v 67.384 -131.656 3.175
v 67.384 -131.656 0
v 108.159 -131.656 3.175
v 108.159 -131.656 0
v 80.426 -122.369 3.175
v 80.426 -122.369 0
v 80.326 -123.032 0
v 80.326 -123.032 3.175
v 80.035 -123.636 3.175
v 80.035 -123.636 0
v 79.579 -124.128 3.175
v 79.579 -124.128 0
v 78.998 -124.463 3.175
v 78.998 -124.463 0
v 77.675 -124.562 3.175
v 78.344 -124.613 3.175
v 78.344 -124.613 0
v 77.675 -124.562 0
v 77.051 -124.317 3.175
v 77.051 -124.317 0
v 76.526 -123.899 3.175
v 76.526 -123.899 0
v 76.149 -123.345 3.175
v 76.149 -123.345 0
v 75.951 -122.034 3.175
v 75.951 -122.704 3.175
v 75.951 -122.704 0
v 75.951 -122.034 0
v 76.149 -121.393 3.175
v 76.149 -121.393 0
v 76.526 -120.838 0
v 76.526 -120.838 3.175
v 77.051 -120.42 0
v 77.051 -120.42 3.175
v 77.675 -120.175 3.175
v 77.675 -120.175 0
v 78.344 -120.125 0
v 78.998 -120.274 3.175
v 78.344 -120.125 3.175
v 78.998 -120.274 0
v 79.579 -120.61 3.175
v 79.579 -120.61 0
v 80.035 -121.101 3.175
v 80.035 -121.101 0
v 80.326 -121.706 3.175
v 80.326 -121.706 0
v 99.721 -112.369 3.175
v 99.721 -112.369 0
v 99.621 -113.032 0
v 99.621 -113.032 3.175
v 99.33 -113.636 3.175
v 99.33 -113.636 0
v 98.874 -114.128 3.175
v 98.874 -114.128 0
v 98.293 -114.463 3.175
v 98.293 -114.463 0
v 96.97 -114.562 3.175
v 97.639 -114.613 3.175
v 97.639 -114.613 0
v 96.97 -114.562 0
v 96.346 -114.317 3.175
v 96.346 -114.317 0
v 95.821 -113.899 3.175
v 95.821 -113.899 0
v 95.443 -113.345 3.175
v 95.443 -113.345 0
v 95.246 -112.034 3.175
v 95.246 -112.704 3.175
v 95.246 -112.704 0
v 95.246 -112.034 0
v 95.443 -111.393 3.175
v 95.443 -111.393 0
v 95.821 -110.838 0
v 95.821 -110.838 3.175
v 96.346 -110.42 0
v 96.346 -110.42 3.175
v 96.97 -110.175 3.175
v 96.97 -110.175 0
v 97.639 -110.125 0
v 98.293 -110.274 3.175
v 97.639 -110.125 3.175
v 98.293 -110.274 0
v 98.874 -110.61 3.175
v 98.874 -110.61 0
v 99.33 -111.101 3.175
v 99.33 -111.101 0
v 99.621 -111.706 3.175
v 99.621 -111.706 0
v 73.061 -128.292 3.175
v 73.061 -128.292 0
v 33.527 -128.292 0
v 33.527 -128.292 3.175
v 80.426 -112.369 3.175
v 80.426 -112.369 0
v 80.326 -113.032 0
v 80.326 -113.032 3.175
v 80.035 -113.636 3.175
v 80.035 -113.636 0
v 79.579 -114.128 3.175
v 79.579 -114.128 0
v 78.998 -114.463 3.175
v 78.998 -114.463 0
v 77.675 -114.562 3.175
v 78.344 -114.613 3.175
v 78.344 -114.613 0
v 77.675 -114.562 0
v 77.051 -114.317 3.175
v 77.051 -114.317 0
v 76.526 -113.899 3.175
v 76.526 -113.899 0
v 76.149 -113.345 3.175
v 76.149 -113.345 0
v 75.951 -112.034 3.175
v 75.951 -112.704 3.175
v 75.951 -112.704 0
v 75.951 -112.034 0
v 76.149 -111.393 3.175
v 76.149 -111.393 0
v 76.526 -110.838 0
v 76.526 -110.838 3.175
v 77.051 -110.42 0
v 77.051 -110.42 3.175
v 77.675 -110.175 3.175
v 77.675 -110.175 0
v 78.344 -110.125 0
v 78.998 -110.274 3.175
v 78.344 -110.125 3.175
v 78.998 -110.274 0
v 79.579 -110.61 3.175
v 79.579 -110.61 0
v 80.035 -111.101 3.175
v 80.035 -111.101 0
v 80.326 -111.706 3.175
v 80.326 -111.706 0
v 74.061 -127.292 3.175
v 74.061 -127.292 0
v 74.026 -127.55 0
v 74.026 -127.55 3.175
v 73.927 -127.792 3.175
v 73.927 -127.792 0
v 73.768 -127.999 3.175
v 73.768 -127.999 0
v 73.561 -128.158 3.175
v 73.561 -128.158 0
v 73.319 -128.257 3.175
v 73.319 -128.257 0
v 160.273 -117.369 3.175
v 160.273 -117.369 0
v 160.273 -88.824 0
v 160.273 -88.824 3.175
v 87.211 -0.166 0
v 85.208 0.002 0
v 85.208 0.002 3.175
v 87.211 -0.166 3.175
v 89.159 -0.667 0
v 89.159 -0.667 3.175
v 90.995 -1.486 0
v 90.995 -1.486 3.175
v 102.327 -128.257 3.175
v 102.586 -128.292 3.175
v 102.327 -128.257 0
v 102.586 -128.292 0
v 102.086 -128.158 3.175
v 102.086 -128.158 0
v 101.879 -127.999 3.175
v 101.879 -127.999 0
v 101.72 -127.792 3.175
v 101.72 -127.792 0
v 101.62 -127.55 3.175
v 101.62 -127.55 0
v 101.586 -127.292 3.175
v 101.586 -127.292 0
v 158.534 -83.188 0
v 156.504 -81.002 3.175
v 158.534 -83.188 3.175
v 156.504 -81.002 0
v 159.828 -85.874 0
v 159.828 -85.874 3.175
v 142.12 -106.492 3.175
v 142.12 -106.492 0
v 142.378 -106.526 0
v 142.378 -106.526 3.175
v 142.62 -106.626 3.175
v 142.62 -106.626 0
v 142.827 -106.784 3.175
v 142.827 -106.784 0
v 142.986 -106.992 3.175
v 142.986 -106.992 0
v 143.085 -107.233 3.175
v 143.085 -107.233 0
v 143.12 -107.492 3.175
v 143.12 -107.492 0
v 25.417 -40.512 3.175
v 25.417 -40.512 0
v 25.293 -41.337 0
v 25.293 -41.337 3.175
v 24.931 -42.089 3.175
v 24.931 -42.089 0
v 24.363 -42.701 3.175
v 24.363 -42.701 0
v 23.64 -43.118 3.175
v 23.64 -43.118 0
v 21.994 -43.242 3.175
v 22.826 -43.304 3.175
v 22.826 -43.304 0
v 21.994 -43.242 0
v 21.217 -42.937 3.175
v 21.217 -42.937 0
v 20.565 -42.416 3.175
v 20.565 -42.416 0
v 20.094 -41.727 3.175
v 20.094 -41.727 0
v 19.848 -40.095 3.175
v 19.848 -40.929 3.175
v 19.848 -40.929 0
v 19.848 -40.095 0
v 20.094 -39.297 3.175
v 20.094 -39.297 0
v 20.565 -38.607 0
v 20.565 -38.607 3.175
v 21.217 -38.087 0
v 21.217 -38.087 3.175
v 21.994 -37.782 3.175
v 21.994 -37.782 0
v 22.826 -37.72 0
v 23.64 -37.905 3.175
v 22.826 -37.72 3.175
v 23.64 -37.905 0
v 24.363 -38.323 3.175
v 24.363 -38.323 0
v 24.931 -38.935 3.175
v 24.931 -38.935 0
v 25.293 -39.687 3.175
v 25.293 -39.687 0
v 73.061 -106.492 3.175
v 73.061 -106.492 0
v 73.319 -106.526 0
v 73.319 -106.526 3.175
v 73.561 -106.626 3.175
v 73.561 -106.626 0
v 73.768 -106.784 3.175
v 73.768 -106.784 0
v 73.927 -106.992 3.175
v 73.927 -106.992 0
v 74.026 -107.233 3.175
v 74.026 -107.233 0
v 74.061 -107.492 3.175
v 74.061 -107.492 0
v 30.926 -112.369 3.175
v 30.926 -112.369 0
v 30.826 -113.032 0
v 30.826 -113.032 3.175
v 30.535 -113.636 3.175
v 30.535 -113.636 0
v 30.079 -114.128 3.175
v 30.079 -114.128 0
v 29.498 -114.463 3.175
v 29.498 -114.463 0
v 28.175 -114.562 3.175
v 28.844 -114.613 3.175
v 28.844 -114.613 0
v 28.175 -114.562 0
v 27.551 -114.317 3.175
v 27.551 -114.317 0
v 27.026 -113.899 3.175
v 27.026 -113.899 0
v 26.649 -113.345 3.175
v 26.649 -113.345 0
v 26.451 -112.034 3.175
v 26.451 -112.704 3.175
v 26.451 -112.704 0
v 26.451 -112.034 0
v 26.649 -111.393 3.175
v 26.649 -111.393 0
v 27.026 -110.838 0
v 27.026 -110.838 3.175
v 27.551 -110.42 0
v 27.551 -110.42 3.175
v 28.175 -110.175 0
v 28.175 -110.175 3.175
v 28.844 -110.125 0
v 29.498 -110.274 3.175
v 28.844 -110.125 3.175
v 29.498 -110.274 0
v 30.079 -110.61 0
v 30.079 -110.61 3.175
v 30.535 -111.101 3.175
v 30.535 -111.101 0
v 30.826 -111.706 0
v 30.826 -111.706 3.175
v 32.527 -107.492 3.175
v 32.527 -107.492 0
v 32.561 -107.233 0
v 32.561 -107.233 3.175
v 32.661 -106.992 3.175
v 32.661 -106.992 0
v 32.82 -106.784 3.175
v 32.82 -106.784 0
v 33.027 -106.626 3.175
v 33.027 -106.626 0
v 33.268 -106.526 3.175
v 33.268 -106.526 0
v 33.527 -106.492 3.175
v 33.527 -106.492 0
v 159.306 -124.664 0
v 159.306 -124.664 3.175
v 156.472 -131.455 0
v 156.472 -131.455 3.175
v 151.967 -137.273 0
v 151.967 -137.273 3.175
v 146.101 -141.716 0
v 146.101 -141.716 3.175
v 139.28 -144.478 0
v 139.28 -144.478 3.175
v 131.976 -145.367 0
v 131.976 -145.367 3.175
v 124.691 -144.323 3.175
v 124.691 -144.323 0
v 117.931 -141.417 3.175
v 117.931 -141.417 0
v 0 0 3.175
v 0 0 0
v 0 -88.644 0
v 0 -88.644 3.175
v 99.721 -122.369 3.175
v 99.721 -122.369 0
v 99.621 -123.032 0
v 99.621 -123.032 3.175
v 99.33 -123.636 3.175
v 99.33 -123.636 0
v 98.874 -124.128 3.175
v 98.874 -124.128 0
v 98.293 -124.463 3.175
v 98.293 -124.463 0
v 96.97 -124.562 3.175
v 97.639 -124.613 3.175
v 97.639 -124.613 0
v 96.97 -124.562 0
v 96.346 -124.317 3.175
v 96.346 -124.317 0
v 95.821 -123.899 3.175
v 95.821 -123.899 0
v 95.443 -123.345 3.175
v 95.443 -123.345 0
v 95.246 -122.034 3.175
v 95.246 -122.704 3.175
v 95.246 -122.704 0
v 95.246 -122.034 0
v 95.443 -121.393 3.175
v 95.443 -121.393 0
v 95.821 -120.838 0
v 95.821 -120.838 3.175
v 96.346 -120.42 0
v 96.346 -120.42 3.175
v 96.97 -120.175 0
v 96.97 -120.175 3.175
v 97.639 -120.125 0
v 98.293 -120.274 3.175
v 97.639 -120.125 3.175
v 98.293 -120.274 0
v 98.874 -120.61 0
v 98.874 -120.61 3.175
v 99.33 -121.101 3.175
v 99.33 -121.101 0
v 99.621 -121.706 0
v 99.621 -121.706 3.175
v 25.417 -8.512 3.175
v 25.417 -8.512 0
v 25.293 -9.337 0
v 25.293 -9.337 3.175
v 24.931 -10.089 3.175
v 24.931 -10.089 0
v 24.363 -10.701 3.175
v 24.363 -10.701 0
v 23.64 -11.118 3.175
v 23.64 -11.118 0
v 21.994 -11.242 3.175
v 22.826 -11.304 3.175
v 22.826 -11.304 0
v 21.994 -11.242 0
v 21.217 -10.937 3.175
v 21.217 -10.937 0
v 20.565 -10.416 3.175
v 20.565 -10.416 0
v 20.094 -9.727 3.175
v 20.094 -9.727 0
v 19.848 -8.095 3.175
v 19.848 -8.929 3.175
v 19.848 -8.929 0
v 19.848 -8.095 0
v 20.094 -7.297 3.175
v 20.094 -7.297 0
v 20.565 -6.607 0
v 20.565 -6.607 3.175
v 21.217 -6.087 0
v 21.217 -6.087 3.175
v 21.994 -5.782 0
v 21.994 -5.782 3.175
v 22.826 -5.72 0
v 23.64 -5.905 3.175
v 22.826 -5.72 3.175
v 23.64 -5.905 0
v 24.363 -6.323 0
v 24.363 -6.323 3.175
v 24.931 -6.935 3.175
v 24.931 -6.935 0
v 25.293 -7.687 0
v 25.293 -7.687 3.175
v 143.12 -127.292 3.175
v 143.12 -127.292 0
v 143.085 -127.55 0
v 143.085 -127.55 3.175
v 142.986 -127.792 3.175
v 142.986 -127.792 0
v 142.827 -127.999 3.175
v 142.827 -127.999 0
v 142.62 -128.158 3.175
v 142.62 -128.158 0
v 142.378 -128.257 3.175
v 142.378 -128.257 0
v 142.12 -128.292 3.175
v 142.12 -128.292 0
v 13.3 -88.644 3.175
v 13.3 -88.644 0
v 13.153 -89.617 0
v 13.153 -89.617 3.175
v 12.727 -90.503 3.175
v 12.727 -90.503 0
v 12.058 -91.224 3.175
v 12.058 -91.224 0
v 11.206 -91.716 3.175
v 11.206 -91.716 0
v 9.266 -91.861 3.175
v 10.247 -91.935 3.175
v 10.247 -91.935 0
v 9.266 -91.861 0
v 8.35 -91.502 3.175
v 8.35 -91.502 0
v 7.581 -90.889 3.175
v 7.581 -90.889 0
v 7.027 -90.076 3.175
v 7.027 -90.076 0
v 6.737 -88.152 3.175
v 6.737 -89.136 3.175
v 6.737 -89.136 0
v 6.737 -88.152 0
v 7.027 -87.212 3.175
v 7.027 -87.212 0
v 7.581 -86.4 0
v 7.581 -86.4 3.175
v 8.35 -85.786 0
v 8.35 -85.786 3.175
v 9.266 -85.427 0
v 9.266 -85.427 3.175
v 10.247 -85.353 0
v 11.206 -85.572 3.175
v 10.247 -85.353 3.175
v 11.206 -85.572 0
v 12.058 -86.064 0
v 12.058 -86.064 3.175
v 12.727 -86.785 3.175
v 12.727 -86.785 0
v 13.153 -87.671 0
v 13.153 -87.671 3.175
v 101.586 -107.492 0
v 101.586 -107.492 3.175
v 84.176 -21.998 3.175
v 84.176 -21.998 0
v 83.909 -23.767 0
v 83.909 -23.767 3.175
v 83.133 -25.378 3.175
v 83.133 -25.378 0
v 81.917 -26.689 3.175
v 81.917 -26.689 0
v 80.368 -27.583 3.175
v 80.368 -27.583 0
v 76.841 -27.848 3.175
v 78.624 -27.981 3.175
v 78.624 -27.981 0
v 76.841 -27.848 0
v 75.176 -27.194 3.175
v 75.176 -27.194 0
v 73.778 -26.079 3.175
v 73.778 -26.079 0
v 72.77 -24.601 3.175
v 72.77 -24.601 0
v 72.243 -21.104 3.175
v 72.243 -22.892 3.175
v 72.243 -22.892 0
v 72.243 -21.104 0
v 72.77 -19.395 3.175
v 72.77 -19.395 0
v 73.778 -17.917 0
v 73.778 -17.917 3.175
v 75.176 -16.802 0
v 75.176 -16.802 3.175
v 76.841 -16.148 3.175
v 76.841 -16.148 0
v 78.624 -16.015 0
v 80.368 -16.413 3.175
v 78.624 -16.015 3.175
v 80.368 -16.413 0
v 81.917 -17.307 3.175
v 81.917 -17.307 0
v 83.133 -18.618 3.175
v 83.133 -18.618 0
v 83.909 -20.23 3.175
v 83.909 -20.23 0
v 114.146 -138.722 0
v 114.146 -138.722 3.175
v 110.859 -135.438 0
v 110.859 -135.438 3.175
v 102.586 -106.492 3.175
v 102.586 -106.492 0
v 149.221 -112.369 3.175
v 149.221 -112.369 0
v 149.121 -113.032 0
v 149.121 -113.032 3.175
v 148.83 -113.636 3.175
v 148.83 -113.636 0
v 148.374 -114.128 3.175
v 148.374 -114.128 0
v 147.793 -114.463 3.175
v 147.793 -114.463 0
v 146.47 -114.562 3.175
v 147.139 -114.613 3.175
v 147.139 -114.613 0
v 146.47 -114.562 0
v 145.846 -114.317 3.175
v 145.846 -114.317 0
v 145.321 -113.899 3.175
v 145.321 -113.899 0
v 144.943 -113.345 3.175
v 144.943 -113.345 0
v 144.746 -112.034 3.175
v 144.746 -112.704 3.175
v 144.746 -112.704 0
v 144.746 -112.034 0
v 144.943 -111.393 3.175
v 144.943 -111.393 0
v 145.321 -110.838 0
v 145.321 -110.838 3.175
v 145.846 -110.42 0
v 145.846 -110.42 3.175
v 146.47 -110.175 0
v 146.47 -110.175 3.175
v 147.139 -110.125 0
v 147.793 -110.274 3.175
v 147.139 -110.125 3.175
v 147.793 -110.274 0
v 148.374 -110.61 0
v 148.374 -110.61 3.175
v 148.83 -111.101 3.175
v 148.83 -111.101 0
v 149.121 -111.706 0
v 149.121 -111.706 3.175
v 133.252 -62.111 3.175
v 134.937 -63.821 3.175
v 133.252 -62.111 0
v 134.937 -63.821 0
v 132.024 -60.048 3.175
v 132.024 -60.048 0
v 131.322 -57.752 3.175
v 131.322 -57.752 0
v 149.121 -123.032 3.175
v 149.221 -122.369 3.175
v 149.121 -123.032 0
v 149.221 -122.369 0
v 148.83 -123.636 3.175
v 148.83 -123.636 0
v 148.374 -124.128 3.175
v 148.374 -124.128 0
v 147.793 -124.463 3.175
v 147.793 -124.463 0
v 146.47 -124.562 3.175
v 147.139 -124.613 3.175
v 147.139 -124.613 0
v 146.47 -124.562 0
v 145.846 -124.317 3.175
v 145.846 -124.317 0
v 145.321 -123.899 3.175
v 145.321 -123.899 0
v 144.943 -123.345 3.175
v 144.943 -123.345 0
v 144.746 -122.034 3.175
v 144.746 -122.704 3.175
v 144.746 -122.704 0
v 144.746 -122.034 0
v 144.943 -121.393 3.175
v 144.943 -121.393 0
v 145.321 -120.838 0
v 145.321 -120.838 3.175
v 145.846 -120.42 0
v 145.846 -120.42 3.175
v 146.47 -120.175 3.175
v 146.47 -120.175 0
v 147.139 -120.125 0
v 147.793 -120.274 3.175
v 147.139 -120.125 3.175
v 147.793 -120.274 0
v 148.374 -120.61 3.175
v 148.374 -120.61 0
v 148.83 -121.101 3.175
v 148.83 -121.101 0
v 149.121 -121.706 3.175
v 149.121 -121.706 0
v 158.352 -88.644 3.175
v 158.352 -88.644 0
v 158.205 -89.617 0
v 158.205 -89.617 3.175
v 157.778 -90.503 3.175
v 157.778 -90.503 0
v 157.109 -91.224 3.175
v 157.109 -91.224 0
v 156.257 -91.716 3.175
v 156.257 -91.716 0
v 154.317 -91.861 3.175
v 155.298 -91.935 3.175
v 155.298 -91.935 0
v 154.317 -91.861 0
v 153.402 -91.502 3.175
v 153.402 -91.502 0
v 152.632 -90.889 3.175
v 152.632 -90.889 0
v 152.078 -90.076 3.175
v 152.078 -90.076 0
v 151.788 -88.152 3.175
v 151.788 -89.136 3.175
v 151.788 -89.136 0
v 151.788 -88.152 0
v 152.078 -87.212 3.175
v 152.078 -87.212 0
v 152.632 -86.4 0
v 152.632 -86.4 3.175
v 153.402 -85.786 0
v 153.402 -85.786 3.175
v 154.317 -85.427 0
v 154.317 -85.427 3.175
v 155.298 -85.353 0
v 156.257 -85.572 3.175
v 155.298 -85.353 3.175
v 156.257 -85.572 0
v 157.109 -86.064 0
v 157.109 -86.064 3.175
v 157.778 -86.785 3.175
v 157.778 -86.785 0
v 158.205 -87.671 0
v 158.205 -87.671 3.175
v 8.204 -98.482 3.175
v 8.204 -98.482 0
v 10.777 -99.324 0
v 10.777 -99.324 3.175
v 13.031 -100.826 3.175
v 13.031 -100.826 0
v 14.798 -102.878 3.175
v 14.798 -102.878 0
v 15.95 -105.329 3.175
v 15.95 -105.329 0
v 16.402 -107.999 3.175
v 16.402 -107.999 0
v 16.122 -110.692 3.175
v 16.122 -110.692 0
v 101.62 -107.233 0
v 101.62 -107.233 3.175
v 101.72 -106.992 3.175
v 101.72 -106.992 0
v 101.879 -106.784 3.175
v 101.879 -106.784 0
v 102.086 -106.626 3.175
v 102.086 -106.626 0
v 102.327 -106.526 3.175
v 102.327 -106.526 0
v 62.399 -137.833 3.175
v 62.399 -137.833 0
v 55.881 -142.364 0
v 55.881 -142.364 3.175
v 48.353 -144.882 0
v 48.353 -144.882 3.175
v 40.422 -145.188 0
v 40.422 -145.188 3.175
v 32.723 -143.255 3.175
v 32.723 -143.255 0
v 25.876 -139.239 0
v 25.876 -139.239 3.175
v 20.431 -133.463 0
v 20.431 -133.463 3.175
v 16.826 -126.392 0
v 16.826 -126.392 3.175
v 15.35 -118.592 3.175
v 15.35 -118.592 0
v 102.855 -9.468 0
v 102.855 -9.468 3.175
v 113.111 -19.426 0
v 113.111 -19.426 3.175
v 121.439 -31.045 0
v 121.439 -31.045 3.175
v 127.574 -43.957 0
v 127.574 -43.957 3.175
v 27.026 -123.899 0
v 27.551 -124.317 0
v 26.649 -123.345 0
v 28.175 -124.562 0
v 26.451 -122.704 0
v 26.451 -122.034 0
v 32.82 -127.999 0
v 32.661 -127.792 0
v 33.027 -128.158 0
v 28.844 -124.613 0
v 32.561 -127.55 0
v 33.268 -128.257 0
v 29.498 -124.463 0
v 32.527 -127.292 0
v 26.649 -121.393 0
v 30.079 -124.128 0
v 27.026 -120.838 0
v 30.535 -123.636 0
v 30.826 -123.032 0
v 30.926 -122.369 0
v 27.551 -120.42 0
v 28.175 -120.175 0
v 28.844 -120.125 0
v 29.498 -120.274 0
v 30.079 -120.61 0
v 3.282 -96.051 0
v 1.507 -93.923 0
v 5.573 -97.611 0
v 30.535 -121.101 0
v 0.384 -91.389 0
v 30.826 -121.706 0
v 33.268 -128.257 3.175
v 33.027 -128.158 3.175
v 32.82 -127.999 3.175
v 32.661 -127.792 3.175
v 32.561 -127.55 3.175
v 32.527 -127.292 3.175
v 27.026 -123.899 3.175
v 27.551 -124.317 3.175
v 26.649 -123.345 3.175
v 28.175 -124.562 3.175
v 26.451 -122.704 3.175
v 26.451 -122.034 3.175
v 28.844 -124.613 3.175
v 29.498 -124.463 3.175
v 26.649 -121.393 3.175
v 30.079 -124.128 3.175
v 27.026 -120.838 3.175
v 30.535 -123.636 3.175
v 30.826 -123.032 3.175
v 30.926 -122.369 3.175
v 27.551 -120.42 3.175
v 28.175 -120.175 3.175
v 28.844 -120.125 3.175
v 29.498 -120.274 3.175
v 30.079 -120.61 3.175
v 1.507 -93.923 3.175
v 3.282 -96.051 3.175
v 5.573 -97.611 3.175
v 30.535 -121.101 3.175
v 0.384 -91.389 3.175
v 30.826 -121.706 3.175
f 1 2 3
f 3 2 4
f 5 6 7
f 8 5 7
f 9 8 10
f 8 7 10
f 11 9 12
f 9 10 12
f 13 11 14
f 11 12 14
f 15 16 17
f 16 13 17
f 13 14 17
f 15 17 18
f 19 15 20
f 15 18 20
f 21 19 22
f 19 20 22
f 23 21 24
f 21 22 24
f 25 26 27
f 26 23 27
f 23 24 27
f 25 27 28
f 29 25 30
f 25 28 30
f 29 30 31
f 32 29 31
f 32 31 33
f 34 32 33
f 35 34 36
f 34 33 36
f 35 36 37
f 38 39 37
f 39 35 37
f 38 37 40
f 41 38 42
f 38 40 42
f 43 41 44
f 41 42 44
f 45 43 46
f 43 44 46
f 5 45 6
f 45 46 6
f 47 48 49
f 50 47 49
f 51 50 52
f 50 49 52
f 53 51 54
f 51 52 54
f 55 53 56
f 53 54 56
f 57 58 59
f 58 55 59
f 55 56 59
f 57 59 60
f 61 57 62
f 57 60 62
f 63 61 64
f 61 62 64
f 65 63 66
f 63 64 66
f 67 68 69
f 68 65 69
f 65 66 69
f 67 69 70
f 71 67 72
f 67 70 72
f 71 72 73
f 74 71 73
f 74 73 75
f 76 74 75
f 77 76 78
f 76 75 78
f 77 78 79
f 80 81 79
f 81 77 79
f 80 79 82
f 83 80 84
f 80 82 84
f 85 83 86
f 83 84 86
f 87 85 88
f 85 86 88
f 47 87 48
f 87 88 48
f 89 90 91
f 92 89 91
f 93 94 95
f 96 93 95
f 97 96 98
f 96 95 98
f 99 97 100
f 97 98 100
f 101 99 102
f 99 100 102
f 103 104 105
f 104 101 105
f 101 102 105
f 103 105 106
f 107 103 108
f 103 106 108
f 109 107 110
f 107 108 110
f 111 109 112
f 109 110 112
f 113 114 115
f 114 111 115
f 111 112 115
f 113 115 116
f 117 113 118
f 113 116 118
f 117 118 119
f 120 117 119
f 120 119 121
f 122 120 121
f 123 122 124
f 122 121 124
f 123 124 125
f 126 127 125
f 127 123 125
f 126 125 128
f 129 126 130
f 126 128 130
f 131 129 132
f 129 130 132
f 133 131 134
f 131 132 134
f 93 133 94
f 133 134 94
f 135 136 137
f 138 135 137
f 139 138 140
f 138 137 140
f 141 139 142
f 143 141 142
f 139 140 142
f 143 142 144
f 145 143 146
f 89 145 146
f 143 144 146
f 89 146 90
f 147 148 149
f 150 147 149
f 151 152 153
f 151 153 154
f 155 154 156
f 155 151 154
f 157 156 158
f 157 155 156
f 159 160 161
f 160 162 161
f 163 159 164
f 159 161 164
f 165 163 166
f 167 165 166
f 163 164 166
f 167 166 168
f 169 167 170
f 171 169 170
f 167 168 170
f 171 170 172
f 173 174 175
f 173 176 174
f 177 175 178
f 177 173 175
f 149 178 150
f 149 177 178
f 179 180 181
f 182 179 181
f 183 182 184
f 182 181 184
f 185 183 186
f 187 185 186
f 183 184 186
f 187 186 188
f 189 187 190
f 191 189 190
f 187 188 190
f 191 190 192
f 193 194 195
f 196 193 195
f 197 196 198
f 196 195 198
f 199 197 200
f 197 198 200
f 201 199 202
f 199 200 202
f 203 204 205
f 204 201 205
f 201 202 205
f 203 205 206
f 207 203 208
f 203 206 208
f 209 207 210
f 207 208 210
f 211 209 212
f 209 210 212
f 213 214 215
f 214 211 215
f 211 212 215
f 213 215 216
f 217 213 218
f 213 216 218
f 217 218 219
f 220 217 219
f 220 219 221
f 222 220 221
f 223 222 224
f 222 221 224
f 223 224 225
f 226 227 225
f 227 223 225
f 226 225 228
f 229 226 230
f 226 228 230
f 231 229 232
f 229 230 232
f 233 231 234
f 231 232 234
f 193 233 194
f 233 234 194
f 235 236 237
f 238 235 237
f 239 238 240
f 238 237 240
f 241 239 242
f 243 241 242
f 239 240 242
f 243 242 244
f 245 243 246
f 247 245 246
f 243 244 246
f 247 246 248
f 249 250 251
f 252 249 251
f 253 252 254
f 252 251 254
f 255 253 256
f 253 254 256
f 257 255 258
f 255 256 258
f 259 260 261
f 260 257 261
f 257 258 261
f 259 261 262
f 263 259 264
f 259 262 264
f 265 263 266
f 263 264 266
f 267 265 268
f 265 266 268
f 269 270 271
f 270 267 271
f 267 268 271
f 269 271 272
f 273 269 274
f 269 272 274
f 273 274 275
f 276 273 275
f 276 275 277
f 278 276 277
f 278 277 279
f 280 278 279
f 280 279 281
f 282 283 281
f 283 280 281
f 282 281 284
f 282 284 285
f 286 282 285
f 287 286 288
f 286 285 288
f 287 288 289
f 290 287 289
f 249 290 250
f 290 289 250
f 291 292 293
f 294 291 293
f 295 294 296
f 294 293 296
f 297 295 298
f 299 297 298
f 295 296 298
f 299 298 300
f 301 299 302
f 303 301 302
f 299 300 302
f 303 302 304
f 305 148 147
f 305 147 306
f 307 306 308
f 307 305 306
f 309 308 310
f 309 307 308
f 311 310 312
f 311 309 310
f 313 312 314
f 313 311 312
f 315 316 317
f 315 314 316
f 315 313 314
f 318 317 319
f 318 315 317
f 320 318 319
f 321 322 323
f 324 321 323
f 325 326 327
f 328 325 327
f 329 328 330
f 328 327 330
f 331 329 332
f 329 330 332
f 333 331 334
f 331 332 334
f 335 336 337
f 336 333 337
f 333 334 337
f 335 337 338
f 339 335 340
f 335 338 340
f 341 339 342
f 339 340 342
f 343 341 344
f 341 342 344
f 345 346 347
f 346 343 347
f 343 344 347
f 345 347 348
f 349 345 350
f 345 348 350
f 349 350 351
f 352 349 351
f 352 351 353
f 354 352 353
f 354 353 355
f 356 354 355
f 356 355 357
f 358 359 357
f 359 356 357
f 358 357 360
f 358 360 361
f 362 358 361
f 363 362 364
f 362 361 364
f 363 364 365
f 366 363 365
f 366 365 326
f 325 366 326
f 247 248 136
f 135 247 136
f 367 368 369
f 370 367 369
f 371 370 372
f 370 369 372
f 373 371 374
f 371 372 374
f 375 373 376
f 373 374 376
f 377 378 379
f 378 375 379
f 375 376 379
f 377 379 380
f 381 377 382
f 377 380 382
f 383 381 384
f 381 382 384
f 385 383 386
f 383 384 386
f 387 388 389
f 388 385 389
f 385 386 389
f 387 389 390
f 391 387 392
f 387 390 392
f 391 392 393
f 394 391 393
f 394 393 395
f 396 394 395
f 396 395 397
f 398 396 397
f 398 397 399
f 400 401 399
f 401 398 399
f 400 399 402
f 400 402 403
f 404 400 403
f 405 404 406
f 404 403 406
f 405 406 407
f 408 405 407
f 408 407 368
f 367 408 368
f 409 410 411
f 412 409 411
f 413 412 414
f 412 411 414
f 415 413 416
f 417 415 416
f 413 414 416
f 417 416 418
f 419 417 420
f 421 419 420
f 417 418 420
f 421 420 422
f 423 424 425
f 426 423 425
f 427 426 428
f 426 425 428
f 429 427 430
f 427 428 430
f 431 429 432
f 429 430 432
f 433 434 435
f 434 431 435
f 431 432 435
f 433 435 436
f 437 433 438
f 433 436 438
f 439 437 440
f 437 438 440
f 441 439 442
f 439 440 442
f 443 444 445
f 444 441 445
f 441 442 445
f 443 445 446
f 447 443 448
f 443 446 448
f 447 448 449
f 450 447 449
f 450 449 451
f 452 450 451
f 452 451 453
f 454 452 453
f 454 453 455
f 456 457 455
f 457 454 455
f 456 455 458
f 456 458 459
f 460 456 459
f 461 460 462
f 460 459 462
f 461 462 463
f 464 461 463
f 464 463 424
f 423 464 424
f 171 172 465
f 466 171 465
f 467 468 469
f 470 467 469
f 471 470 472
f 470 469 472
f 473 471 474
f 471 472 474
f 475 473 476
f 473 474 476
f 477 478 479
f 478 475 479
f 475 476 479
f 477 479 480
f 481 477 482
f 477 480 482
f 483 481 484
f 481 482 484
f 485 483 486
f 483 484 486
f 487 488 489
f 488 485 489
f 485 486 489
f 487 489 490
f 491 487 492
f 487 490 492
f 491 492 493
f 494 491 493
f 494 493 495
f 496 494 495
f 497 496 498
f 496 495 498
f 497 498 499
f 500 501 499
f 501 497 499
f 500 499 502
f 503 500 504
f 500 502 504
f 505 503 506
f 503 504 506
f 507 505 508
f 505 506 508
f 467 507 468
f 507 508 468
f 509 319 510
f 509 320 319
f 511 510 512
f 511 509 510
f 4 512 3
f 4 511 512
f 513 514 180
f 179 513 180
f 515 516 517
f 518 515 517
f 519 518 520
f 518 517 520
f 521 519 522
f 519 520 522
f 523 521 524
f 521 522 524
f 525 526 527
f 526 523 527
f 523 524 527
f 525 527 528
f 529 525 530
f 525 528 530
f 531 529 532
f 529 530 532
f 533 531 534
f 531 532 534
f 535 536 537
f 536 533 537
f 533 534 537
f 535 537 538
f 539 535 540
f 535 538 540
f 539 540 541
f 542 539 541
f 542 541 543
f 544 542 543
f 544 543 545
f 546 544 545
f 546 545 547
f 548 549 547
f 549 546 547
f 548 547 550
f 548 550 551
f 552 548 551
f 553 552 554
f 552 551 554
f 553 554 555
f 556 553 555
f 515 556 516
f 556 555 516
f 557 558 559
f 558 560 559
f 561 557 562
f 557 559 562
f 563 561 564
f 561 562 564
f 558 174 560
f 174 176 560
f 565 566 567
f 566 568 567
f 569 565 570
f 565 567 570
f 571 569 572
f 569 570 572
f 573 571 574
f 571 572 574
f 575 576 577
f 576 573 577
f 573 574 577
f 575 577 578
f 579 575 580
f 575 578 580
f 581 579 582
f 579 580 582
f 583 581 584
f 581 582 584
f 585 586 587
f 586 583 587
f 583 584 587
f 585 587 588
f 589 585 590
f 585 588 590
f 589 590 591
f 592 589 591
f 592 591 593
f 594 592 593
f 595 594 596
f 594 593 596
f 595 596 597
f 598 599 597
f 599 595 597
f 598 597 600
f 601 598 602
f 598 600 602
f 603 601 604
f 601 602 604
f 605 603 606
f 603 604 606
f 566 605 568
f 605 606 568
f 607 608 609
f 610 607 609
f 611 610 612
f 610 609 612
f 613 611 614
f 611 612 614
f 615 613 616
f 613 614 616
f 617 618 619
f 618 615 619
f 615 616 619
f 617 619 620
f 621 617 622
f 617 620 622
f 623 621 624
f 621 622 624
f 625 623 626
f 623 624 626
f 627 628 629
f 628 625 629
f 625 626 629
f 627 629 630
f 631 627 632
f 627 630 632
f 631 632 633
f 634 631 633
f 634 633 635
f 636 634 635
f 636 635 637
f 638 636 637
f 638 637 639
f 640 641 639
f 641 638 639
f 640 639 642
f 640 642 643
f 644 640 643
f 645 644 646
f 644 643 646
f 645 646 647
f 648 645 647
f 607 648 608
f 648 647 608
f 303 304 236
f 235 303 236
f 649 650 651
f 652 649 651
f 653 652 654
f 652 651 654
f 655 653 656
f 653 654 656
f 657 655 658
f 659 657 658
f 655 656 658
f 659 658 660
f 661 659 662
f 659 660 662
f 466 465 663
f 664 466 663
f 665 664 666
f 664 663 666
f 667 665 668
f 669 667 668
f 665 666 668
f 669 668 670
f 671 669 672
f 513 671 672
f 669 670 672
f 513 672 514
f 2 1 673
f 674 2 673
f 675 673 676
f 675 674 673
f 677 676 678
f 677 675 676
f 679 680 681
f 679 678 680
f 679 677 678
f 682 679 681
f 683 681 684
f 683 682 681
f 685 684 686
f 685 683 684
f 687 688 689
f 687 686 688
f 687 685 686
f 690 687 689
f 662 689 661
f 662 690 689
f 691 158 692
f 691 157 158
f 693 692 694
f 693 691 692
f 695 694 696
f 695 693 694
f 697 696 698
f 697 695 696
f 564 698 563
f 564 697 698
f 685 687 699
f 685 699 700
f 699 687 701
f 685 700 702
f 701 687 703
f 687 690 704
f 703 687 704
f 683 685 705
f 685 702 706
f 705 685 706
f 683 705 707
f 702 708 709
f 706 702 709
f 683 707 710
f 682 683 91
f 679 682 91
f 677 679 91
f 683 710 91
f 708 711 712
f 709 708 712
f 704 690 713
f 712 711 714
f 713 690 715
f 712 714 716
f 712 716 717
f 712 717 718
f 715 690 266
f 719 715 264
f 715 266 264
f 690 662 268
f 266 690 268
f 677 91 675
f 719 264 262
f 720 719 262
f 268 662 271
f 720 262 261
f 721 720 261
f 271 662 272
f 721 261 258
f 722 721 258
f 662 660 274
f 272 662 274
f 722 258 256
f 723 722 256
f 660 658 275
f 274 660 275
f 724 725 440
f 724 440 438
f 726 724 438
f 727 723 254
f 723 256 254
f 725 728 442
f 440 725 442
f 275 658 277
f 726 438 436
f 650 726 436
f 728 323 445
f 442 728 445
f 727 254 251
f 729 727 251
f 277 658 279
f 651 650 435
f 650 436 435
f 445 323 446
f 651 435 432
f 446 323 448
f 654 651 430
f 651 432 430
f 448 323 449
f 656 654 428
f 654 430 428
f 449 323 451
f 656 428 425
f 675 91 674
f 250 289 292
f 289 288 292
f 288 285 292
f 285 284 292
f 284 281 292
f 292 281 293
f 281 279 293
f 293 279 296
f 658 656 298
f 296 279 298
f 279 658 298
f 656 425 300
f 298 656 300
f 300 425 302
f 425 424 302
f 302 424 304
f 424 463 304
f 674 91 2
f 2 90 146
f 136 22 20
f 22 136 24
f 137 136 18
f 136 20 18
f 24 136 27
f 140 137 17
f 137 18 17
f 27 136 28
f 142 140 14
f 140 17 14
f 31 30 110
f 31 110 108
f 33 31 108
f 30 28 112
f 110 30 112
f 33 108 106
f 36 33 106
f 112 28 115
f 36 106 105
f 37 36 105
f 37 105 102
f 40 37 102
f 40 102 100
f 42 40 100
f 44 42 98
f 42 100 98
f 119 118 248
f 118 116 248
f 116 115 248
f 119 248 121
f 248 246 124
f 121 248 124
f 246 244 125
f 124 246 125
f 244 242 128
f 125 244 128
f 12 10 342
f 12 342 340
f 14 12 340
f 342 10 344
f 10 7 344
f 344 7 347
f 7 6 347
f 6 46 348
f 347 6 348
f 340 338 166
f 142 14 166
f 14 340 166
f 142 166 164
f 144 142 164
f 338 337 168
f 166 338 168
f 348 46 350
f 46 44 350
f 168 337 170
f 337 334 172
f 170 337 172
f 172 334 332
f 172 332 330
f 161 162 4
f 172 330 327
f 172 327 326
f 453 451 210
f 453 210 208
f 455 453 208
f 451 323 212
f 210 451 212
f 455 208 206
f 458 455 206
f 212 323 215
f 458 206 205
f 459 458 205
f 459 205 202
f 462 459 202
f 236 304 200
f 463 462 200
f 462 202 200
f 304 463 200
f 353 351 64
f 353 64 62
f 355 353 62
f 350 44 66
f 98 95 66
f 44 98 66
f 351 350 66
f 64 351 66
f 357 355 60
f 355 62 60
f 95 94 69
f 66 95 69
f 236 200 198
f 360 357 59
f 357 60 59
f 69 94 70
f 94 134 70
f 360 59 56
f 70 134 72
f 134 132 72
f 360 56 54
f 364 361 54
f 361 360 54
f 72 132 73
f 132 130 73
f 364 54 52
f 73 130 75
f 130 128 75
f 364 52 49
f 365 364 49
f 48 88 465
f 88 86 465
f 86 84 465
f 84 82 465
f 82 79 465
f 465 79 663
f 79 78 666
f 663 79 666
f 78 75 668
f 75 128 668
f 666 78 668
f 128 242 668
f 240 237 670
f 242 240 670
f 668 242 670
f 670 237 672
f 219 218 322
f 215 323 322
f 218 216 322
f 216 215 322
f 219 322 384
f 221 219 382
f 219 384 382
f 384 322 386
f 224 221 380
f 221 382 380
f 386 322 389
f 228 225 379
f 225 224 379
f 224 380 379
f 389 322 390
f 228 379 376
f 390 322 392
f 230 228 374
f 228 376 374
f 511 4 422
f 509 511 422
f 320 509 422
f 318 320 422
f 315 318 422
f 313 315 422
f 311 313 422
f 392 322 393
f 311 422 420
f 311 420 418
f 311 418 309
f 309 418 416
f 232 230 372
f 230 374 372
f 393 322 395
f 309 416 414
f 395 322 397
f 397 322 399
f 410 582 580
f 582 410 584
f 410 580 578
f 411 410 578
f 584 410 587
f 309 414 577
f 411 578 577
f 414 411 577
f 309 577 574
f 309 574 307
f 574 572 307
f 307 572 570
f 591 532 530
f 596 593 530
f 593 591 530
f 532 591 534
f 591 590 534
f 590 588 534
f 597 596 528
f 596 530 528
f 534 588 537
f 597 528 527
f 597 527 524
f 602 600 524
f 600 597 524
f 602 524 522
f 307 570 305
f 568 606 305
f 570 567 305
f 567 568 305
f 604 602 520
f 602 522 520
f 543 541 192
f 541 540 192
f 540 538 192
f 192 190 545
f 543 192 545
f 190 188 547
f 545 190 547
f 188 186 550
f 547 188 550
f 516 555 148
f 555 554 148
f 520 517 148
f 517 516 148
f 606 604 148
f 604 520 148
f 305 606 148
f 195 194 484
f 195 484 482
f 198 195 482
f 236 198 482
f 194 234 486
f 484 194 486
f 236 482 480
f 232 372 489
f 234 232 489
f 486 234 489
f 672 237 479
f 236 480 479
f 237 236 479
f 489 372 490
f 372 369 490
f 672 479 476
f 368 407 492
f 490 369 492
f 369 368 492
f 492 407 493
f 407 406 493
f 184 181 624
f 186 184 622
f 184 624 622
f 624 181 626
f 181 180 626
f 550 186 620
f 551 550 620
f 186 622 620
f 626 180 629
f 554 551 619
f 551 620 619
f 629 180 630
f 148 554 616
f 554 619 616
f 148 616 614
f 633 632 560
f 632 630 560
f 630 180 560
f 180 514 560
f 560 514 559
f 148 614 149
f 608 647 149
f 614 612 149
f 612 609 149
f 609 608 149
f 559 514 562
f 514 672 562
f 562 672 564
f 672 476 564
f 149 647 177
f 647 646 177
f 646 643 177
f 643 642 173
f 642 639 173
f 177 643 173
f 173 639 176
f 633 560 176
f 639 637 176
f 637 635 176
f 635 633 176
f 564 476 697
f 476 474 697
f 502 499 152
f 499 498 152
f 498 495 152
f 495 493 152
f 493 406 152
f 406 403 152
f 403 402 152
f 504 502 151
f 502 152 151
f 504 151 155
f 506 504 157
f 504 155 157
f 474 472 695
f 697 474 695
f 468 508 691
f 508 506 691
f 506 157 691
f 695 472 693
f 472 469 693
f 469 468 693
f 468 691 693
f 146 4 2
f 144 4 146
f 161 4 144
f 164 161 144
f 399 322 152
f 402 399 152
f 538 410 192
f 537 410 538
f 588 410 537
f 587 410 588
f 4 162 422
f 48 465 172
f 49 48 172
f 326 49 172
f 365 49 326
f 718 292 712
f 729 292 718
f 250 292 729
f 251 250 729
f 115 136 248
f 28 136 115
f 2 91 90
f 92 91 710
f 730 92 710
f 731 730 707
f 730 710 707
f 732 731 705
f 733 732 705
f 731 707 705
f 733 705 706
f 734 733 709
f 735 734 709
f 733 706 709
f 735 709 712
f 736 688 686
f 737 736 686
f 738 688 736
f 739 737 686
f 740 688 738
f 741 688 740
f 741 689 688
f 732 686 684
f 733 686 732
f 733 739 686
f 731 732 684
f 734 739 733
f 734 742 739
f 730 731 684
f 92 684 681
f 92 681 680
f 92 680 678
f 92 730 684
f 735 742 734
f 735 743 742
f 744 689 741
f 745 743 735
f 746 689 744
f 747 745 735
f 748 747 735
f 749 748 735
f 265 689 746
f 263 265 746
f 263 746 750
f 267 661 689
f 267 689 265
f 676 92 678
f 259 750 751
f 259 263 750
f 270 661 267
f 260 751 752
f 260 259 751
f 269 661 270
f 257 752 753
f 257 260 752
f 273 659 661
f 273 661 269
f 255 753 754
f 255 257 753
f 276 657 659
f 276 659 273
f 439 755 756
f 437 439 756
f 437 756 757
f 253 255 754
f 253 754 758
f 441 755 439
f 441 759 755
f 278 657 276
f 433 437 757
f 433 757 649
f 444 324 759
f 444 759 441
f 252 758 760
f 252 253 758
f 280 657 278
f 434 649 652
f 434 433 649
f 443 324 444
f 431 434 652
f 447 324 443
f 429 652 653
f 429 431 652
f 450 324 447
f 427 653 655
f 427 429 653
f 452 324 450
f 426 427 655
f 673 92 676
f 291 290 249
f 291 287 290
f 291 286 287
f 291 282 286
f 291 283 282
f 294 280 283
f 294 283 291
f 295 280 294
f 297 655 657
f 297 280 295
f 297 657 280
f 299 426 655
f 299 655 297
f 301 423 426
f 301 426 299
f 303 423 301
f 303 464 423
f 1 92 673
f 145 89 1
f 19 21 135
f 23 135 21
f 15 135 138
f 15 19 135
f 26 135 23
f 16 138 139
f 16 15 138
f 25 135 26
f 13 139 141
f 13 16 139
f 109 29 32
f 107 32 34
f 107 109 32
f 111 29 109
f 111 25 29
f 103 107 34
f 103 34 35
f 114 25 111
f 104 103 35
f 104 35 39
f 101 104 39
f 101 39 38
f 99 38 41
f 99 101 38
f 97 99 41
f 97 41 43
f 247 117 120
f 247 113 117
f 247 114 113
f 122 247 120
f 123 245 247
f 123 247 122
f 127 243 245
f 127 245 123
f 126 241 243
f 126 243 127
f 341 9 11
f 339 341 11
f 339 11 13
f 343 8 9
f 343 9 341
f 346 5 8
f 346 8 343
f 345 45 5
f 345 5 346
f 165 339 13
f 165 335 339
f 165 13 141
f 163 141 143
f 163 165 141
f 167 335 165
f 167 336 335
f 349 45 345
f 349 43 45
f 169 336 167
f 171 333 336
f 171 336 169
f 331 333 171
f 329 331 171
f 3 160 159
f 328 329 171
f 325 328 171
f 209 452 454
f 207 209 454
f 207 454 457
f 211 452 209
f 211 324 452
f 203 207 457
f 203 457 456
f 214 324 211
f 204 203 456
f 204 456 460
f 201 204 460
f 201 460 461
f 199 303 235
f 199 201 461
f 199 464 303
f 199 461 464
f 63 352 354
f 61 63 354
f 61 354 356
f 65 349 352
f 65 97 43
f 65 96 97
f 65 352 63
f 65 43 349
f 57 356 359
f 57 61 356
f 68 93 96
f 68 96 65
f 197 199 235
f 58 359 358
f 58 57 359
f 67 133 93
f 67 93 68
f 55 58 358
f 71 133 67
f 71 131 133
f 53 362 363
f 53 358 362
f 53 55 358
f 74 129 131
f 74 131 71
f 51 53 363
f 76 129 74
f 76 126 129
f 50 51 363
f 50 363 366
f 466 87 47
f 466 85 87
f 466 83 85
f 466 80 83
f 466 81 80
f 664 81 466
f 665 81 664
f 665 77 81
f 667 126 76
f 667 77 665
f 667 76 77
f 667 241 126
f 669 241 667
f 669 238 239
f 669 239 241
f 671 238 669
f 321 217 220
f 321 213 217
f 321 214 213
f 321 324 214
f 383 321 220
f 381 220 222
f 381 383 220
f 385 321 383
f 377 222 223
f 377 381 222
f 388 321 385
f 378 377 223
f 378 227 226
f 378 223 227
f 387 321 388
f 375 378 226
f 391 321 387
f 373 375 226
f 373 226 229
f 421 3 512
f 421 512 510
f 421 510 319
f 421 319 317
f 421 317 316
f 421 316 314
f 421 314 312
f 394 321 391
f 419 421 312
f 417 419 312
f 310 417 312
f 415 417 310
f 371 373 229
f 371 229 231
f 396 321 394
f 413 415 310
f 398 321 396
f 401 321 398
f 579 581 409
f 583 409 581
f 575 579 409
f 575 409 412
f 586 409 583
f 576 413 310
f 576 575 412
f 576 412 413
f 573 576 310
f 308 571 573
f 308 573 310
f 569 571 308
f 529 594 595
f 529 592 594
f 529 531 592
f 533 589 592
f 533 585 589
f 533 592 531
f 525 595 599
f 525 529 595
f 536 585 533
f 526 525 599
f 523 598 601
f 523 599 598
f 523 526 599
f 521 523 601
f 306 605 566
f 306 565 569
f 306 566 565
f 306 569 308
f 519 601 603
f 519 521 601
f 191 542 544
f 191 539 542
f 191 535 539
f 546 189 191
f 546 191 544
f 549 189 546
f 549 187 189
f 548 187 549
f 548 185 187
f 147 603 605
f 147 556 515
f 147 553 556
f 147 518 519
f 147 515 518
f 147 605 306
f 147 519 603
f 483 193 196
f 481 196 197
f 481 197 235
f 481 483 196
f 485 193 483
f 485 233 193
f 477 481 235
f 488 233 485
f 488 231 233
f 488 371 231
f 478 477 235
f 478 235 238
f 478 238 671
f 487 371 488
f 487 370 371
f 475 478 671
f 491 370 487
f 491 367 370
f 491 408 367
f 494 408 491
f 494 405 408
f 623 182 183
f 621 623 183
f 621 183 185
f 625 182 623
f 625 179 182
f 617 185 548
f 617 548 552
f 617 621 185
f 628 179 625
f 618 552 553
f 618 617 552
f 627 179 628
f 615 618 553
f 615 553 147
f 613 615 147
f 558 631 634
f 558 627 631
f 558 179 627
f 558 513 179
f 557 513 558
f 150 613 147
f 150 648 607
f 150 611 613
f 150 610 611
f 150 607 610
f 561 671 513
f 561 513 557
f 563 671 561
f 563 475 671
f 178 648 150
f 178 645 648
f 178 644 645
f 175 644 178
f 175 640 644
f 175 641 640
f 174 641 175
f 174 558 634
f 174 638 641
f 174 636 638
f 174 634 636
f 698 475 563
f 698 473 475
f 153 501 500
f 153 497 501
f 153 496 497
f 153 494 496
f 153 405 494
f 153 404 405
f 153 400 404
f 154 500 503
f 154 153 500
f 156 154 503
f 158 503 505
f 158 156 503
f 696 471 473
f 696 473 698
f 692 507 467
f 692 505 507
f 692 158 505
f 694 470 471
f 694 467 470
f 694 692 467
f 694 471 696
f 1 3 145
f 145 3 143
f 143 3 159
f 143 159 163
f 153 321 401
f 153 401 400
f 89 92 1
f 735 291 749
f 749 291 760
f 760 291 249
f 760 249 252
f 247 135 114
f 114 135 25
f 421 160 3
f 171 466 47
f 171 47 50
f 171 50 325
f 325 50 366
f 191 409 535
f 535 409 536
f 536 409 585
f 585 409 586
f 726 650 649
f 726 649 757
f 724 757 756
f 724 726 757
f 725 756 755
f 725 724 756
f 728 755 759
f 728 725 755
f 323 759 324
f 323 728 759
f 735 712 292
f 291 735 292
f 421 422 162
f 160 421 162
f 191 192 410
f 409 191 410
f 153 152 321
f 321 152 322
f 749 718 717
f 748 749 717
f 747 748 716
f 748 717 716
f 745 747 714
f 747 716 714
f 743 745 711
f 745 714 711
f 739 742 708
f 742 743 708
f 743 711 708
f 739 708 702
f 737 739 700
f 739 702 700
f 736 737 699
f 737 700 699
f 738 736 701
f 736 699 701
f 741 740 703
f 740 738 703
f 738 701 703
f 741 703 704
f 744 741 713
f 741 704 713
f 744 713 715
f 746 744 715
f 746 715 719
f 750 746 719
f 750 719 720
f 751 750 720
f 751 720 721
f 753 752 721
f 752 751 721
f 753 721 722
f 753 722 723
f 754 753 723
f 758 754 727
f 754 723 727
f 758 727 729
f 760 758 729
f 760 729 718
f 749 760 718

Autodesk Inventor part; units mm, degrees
ref_plane "YZ Plane" through (0, 0, 0) normal (1, 0, 0) x (0, 1, 0)
ref_plane "XZ Plane" through (0, 0, 0) normal (0, 1, 0) x (-1, 0, 0)
ref_plane "XY Plane" through (0, 0, 0) normal (0, 0, 1) x (1, 0, 0)
sketch "Sketch1" plane through (0, 0, 0) normal (0, 0, 1) x (1, 0, 0)
  arc A0 (16.121808, -110.692366) -> (67.383886, -131.656361) centre (43.321682, -117.338179) ccw
  line L0 (67.383886, -131.656361) -> (108.159478, -131.656361)
  arc A1 (108.159478, -131.656361) -> (139.594615, -90.326332) centre (132.221682, -117.338179) ccw
  arc A2 (132.227805, -80.679244) -> (139.594615, -90.326332) centre (142.227805, -80.679244) ccw
  line L1 (132.227805, -80.679244) -> (132.227805, -71.827)
  arc A3 (132.227805, -71.827) -> (90.658044, -1.487819) centre (51.933317, -71.827) ccw
  arc A4 (90.658044, -1.487819) -> (84.870639, 0) centre (84.870639, -12) ccw
  line L2 (84.870639, 0) -> (0, 0)
  line L3 (0, 0) -> (0, -88.644145)
  arc A5 (0, -88.644145) -> (8.203784, -98.481503) centre (10, -88.644145) ccw
  arc A6 (16.121808, -110.692366) -> (8.203784, -98.481503) centre (6.407567, -108.318861) ccw
  circle A7 centre (121.188208, -82.443861) radius 3.3
  arc A8 (145.794404, -114.286904) -> (148.095336, -110.420107) centre (146.970651, -112.368846) ccw
  circle A9 centre (97.470651, -122.368861) radius 2.25
  circle A10 centre (97.470651, -112.368852) radius 2.25
  circle A11 centre (78.175839, -122.368861) radius 2.25
  arc A12 (145.794404, -124.286918) -> (148.095336, -120.420122) centre (146.970651, -122.368861) ccw
  circle A13 centre (22.617078, -8.511936) radius 2.8
  circle A14 centre (22.617078, -40.511936) radius 2.8
  circle A15 centre (28.675839, -122.368861) radius 2.25
  circle A16 centre (28.675837, -112.368861) radius 2.25
  circle A17 centre (78.175837, -112.368855) radius 2.25
  circle A18 centre (10, -88.644145) radius 3.3
  line L4 (73.060526, -128.291526) -> (33.526976, -128.291526)
  arc A19 (32.526976, -127.291526) -> (33.526976, -128.291526) centre (33.526976, -127.291526) ccw
  line L5 (32.526976, -127.291526) -> (32.526973, -107.491526)
  arc A20 (33.526973, -106.491526) -> (32.526973, -107.491526) centre (33.526973, -107.491526) ccw
  line L6 (33.526973, -106.491526) -> (73.060526, -106.491526)
  arc A21 (74.060526, -107.491526) -> (73.060526, -106.491526) centre (73.060526, -107.491526) ccw
  line L7 (74.060526, -107.491526) -> (74.060526, -127.291526)
  arc A22 (73.060526, -128.291526) -> (74.060526, -127.291526) centre (73.060526, -127.291526) ccw
  line L8 (142.119512, -128.291526) -> (102.585962, -128.291526)
  arc A23 (101.585962, -127.291526) -> (102.585962, -128.291526) centre (102.585962, -127.291526) ccw
  line L9 (101.585962, -127.291526) -> (101.585962, -107.491526)
  arc A24 (102.585962, -106.491526) -> (101.585962, -107.491526) centre (102.585962, -107.491526) ccw
  line L10 (102.585962, -106.491526) -> (142.119515, -106.491526)
  arc A25 (143.119515, -107.491526) -> (142.119515, -106.491526) centre (142.119515, -107.491526) ccw
  line L11 (143.119515, -107.491526) -> (143.119512, -127.291526)
  arc A26 (142.119512, -128.291526) -> (143.119512, -127.291526) centre (142.119512, -127.291526) ccw
  circle A27 centre (146.970651, -112.368846) radius 2.25
  circle A28 centre (146.970651, -122.368861) radius 2.25
  line L12 (28.675837, -112.368861) -> (146.970651, -112.368846) construction
  line L13 (28.675839, -122.368861) -> (146.970651, -122.368861) construction
  circle A29 centre (43.373245, -117.368861) radius 6
  line L14 (67.43545, -131.687043) -> (108.211041, -131.687043)
  arc A30 (108.211041, -131.687043) -> (160.273251, -117.36885) centre (132.273245, -117.36885) ccw
  line L15 (160.273251, -117.36885) -> (160.273251, -88.823719)
  arc A31 (160.273251, -88.823719) -> (156.504028, -81.00212) centre (150.273251, -88.823719) ccw
  line L16 (156.504028, -81.00212) -> (134.936633, -63.821281)
  arc A32 (131.322196, -57.752321) -> (134.936633, -63.821281) centre (141.167411, -55.999682) ccw
  arc A33 (131.322196, -57.752321) -> (90.995274, -1.485865) centre (52.270547, -71.825046) ccw
  arc A34 (90.995274, -1.485865) -> (85.207869, 0.001954) centre (85.207869, -11.998046) ccw
  line L17 (85.207869, 0.001954) -> (0.051563, 0.001954)
  line L18 (0.051563, 0.001954) -> (0.051563, -88.674827)
  arc A35 (0.051563, -88.674827) -> (8.255347, -98.512185) centre (10.051563, -88.674827) ccw
  arc A36 (16.173371, -110.723048) -> (8.255347, -98.512185) centre (6.45913, -108.349543) ccw
  arc A37 (16.173371, -110.723048) -> (67.43545, -131.687043) centre (43.373245, -117.368861) ccw
  circle A38 centre (22.617078, -40.511936) radius 2.8
  circle A39 centre (22.617078, -8.511936) radius 2.8
  circle A40 centre (155.051563, -88.644145) radius 3.3
  circle A41 centre (10.051563, -88.644145) radius 3.3
  circle A42 centre (132.273245, -117.36885) radius 6
  circle A43 centre (78.175837, -21.998046) radius 3.25
  circle A44 centre (78.175837, -21.998046) radius 6
  point P0 (58.854578, -117.368861)
  point P1 (148.095336, -110.420107)
  point P2 (117.931008, -141.41673)
  point P3 (0.051563, 0)
  dimension "d2" = 49.5
  dimension "d3" = 49.5
  dimension "d4" = 49.5
  dimension "d5" = 49.5
  dimension "d6" = 10
  dimension "d7" = 12
  dimension "d8" = 22
sketch "Sketch1 outline for Extrusion1" plane through (0, 0, 0) normal (0, 0, 1) x (1, 0, 0)
  line L0 (85.207869, 0.001954) -> (0, 0)
  line L1 (0, 0) -> (0, -88.644145)
  arc A0 (0, -88.644145) -> (8.203784, -98.481503) centre (10, -88.644145) ccw
  arc A1 (8.203784, -98.481503) -> (16.121808, -110.692366) centre (6.407567, -108.318861) cw
  arc A2 (16.121808, -110.692366) -> (67.383886, -131.656361) centre (43.321682, -117.338179) ccw
  line L2 (67.383886, -131.656361) -> (108.159478, -131.656361)
  arc A3 (108.159478, -131.656361) -> (117.931008, -141.41673) centre (132.221682, -117.338179) ccw
  arc A4 (117.931008, -141.41673) -> (160.273251, -117.36885) centre (132.273245, -117.36885) ccw
  line L3 (160.273251, -117.36885) -> (160.273251, -88.823719)
  arc A5 (160.273251, -88.823719) -> (156.504028, -81.00212) centre (150.273251, -88.823719) ccw
  line L4 (156.504028, -81.00212) -> (134.936633, -63.821281)
  arc A6 (134.936633, -63.821281) -> (131.322196, -57.752321) centre (141.167411, -55.999682) cw
  arc A7 (131.322196, -57.752321) -> (90.995274, -1.485865) centre (52.270547, -71.825046) ccw
  arc A8 (90.995274, -1.485865) -> (85.207869, 0.001954) centre (85.207869, -11.998046) ccw
  circle A9 centre (155.051563, -88.644145) radius 3.3
  circle A10 centre (78.175837, -21.998046) radius 6
  circle A11 centre (22.617078, -8.511936) radius 2.8
  circle A12 centre (22.617078, -40.511936) radius 2.8
  circle A13 centre (146.970651, -112.368846) radius 2.25
  circle A14 centre (28.675839, -122.368861) radius 2.25
  circle A15 centre (28.675837, -112.368861) radius 2.25
  line L5 (74.060526, -107.491526) -> (74.060526, -127.291526)
  arc A16 (74.060526, -127.291526) -> (73.060526, -128.291526) centre (73.060526, -127.291526) cw
  line L6 (73.060526, -128.291526) -> (33.526976, -128.291526)
  arc A17 (33.526976, -128.291526) -> (32.526976, -127.291526) centre (33.526976, -127.291526) cw
  line L7 (32.526976, -127.291526) -> (32.526973, -107.491526)
  arc A18 (32.526973, -107.491526) -> (33.526973, -106.491526) centre (33.526973, -107.491526) cw
  line L8 (33.526973, -106.491526) -> (73.060526, -106.491526)
  arc A19 (73.060526, -106.491526) -> (74.060526, -107.491526) centre (73.060526, -107.491526) cw
  circle A20 centre (10, -88.644145) radius 3.3
  circle A21 centre (78.175839, -122.368861) radius 2.25
  circle A22 centre (97.470651, -122.368861) radius 2.25
  circle A23 centre (78.175837, -112.368855) radius 2.25
  circle A24 centre (97.470651, -112.368852) radius 2.25
  line L9 (102.585962, -106.491526) -> (142.119515, -106.491526)
  arc A25 (142.119515, -106.491526) -> (143.119515, -107.491526) centre (142.119515, -107.491526) cw
  line L10 (143.119515, -107.491526) -> (143.119512, -127.291526)
  arc A26 (143.119512, -127.291526) -> (142.119512, -128.291526) centre (142.119512, -127.291526) cw
  line L11 (142.119512, -128.291526) -> (102.585962, -128.291526)
  arc A27 (102.585962, -128.291526) -> (101.585962, -127.291526) centre (102.585962, -127.291526) cw
  line L12 (101.585962, -127.291526) -> (101.585962, -107.491526)
  arc A28 (101.585962, -107.491526) -> (102.585962, -106.491526) centre (102.585962, -107.491526) cw
  circle A29 centre (146.970651, -122.368861) radius 2.25
extrude "Extrusion1" add sketch "Sketch1 outline for Extrusion1" along normal blind 3.175
properties part number "Intake Sides V4_servo" material "Polycarbonate, Clear"
